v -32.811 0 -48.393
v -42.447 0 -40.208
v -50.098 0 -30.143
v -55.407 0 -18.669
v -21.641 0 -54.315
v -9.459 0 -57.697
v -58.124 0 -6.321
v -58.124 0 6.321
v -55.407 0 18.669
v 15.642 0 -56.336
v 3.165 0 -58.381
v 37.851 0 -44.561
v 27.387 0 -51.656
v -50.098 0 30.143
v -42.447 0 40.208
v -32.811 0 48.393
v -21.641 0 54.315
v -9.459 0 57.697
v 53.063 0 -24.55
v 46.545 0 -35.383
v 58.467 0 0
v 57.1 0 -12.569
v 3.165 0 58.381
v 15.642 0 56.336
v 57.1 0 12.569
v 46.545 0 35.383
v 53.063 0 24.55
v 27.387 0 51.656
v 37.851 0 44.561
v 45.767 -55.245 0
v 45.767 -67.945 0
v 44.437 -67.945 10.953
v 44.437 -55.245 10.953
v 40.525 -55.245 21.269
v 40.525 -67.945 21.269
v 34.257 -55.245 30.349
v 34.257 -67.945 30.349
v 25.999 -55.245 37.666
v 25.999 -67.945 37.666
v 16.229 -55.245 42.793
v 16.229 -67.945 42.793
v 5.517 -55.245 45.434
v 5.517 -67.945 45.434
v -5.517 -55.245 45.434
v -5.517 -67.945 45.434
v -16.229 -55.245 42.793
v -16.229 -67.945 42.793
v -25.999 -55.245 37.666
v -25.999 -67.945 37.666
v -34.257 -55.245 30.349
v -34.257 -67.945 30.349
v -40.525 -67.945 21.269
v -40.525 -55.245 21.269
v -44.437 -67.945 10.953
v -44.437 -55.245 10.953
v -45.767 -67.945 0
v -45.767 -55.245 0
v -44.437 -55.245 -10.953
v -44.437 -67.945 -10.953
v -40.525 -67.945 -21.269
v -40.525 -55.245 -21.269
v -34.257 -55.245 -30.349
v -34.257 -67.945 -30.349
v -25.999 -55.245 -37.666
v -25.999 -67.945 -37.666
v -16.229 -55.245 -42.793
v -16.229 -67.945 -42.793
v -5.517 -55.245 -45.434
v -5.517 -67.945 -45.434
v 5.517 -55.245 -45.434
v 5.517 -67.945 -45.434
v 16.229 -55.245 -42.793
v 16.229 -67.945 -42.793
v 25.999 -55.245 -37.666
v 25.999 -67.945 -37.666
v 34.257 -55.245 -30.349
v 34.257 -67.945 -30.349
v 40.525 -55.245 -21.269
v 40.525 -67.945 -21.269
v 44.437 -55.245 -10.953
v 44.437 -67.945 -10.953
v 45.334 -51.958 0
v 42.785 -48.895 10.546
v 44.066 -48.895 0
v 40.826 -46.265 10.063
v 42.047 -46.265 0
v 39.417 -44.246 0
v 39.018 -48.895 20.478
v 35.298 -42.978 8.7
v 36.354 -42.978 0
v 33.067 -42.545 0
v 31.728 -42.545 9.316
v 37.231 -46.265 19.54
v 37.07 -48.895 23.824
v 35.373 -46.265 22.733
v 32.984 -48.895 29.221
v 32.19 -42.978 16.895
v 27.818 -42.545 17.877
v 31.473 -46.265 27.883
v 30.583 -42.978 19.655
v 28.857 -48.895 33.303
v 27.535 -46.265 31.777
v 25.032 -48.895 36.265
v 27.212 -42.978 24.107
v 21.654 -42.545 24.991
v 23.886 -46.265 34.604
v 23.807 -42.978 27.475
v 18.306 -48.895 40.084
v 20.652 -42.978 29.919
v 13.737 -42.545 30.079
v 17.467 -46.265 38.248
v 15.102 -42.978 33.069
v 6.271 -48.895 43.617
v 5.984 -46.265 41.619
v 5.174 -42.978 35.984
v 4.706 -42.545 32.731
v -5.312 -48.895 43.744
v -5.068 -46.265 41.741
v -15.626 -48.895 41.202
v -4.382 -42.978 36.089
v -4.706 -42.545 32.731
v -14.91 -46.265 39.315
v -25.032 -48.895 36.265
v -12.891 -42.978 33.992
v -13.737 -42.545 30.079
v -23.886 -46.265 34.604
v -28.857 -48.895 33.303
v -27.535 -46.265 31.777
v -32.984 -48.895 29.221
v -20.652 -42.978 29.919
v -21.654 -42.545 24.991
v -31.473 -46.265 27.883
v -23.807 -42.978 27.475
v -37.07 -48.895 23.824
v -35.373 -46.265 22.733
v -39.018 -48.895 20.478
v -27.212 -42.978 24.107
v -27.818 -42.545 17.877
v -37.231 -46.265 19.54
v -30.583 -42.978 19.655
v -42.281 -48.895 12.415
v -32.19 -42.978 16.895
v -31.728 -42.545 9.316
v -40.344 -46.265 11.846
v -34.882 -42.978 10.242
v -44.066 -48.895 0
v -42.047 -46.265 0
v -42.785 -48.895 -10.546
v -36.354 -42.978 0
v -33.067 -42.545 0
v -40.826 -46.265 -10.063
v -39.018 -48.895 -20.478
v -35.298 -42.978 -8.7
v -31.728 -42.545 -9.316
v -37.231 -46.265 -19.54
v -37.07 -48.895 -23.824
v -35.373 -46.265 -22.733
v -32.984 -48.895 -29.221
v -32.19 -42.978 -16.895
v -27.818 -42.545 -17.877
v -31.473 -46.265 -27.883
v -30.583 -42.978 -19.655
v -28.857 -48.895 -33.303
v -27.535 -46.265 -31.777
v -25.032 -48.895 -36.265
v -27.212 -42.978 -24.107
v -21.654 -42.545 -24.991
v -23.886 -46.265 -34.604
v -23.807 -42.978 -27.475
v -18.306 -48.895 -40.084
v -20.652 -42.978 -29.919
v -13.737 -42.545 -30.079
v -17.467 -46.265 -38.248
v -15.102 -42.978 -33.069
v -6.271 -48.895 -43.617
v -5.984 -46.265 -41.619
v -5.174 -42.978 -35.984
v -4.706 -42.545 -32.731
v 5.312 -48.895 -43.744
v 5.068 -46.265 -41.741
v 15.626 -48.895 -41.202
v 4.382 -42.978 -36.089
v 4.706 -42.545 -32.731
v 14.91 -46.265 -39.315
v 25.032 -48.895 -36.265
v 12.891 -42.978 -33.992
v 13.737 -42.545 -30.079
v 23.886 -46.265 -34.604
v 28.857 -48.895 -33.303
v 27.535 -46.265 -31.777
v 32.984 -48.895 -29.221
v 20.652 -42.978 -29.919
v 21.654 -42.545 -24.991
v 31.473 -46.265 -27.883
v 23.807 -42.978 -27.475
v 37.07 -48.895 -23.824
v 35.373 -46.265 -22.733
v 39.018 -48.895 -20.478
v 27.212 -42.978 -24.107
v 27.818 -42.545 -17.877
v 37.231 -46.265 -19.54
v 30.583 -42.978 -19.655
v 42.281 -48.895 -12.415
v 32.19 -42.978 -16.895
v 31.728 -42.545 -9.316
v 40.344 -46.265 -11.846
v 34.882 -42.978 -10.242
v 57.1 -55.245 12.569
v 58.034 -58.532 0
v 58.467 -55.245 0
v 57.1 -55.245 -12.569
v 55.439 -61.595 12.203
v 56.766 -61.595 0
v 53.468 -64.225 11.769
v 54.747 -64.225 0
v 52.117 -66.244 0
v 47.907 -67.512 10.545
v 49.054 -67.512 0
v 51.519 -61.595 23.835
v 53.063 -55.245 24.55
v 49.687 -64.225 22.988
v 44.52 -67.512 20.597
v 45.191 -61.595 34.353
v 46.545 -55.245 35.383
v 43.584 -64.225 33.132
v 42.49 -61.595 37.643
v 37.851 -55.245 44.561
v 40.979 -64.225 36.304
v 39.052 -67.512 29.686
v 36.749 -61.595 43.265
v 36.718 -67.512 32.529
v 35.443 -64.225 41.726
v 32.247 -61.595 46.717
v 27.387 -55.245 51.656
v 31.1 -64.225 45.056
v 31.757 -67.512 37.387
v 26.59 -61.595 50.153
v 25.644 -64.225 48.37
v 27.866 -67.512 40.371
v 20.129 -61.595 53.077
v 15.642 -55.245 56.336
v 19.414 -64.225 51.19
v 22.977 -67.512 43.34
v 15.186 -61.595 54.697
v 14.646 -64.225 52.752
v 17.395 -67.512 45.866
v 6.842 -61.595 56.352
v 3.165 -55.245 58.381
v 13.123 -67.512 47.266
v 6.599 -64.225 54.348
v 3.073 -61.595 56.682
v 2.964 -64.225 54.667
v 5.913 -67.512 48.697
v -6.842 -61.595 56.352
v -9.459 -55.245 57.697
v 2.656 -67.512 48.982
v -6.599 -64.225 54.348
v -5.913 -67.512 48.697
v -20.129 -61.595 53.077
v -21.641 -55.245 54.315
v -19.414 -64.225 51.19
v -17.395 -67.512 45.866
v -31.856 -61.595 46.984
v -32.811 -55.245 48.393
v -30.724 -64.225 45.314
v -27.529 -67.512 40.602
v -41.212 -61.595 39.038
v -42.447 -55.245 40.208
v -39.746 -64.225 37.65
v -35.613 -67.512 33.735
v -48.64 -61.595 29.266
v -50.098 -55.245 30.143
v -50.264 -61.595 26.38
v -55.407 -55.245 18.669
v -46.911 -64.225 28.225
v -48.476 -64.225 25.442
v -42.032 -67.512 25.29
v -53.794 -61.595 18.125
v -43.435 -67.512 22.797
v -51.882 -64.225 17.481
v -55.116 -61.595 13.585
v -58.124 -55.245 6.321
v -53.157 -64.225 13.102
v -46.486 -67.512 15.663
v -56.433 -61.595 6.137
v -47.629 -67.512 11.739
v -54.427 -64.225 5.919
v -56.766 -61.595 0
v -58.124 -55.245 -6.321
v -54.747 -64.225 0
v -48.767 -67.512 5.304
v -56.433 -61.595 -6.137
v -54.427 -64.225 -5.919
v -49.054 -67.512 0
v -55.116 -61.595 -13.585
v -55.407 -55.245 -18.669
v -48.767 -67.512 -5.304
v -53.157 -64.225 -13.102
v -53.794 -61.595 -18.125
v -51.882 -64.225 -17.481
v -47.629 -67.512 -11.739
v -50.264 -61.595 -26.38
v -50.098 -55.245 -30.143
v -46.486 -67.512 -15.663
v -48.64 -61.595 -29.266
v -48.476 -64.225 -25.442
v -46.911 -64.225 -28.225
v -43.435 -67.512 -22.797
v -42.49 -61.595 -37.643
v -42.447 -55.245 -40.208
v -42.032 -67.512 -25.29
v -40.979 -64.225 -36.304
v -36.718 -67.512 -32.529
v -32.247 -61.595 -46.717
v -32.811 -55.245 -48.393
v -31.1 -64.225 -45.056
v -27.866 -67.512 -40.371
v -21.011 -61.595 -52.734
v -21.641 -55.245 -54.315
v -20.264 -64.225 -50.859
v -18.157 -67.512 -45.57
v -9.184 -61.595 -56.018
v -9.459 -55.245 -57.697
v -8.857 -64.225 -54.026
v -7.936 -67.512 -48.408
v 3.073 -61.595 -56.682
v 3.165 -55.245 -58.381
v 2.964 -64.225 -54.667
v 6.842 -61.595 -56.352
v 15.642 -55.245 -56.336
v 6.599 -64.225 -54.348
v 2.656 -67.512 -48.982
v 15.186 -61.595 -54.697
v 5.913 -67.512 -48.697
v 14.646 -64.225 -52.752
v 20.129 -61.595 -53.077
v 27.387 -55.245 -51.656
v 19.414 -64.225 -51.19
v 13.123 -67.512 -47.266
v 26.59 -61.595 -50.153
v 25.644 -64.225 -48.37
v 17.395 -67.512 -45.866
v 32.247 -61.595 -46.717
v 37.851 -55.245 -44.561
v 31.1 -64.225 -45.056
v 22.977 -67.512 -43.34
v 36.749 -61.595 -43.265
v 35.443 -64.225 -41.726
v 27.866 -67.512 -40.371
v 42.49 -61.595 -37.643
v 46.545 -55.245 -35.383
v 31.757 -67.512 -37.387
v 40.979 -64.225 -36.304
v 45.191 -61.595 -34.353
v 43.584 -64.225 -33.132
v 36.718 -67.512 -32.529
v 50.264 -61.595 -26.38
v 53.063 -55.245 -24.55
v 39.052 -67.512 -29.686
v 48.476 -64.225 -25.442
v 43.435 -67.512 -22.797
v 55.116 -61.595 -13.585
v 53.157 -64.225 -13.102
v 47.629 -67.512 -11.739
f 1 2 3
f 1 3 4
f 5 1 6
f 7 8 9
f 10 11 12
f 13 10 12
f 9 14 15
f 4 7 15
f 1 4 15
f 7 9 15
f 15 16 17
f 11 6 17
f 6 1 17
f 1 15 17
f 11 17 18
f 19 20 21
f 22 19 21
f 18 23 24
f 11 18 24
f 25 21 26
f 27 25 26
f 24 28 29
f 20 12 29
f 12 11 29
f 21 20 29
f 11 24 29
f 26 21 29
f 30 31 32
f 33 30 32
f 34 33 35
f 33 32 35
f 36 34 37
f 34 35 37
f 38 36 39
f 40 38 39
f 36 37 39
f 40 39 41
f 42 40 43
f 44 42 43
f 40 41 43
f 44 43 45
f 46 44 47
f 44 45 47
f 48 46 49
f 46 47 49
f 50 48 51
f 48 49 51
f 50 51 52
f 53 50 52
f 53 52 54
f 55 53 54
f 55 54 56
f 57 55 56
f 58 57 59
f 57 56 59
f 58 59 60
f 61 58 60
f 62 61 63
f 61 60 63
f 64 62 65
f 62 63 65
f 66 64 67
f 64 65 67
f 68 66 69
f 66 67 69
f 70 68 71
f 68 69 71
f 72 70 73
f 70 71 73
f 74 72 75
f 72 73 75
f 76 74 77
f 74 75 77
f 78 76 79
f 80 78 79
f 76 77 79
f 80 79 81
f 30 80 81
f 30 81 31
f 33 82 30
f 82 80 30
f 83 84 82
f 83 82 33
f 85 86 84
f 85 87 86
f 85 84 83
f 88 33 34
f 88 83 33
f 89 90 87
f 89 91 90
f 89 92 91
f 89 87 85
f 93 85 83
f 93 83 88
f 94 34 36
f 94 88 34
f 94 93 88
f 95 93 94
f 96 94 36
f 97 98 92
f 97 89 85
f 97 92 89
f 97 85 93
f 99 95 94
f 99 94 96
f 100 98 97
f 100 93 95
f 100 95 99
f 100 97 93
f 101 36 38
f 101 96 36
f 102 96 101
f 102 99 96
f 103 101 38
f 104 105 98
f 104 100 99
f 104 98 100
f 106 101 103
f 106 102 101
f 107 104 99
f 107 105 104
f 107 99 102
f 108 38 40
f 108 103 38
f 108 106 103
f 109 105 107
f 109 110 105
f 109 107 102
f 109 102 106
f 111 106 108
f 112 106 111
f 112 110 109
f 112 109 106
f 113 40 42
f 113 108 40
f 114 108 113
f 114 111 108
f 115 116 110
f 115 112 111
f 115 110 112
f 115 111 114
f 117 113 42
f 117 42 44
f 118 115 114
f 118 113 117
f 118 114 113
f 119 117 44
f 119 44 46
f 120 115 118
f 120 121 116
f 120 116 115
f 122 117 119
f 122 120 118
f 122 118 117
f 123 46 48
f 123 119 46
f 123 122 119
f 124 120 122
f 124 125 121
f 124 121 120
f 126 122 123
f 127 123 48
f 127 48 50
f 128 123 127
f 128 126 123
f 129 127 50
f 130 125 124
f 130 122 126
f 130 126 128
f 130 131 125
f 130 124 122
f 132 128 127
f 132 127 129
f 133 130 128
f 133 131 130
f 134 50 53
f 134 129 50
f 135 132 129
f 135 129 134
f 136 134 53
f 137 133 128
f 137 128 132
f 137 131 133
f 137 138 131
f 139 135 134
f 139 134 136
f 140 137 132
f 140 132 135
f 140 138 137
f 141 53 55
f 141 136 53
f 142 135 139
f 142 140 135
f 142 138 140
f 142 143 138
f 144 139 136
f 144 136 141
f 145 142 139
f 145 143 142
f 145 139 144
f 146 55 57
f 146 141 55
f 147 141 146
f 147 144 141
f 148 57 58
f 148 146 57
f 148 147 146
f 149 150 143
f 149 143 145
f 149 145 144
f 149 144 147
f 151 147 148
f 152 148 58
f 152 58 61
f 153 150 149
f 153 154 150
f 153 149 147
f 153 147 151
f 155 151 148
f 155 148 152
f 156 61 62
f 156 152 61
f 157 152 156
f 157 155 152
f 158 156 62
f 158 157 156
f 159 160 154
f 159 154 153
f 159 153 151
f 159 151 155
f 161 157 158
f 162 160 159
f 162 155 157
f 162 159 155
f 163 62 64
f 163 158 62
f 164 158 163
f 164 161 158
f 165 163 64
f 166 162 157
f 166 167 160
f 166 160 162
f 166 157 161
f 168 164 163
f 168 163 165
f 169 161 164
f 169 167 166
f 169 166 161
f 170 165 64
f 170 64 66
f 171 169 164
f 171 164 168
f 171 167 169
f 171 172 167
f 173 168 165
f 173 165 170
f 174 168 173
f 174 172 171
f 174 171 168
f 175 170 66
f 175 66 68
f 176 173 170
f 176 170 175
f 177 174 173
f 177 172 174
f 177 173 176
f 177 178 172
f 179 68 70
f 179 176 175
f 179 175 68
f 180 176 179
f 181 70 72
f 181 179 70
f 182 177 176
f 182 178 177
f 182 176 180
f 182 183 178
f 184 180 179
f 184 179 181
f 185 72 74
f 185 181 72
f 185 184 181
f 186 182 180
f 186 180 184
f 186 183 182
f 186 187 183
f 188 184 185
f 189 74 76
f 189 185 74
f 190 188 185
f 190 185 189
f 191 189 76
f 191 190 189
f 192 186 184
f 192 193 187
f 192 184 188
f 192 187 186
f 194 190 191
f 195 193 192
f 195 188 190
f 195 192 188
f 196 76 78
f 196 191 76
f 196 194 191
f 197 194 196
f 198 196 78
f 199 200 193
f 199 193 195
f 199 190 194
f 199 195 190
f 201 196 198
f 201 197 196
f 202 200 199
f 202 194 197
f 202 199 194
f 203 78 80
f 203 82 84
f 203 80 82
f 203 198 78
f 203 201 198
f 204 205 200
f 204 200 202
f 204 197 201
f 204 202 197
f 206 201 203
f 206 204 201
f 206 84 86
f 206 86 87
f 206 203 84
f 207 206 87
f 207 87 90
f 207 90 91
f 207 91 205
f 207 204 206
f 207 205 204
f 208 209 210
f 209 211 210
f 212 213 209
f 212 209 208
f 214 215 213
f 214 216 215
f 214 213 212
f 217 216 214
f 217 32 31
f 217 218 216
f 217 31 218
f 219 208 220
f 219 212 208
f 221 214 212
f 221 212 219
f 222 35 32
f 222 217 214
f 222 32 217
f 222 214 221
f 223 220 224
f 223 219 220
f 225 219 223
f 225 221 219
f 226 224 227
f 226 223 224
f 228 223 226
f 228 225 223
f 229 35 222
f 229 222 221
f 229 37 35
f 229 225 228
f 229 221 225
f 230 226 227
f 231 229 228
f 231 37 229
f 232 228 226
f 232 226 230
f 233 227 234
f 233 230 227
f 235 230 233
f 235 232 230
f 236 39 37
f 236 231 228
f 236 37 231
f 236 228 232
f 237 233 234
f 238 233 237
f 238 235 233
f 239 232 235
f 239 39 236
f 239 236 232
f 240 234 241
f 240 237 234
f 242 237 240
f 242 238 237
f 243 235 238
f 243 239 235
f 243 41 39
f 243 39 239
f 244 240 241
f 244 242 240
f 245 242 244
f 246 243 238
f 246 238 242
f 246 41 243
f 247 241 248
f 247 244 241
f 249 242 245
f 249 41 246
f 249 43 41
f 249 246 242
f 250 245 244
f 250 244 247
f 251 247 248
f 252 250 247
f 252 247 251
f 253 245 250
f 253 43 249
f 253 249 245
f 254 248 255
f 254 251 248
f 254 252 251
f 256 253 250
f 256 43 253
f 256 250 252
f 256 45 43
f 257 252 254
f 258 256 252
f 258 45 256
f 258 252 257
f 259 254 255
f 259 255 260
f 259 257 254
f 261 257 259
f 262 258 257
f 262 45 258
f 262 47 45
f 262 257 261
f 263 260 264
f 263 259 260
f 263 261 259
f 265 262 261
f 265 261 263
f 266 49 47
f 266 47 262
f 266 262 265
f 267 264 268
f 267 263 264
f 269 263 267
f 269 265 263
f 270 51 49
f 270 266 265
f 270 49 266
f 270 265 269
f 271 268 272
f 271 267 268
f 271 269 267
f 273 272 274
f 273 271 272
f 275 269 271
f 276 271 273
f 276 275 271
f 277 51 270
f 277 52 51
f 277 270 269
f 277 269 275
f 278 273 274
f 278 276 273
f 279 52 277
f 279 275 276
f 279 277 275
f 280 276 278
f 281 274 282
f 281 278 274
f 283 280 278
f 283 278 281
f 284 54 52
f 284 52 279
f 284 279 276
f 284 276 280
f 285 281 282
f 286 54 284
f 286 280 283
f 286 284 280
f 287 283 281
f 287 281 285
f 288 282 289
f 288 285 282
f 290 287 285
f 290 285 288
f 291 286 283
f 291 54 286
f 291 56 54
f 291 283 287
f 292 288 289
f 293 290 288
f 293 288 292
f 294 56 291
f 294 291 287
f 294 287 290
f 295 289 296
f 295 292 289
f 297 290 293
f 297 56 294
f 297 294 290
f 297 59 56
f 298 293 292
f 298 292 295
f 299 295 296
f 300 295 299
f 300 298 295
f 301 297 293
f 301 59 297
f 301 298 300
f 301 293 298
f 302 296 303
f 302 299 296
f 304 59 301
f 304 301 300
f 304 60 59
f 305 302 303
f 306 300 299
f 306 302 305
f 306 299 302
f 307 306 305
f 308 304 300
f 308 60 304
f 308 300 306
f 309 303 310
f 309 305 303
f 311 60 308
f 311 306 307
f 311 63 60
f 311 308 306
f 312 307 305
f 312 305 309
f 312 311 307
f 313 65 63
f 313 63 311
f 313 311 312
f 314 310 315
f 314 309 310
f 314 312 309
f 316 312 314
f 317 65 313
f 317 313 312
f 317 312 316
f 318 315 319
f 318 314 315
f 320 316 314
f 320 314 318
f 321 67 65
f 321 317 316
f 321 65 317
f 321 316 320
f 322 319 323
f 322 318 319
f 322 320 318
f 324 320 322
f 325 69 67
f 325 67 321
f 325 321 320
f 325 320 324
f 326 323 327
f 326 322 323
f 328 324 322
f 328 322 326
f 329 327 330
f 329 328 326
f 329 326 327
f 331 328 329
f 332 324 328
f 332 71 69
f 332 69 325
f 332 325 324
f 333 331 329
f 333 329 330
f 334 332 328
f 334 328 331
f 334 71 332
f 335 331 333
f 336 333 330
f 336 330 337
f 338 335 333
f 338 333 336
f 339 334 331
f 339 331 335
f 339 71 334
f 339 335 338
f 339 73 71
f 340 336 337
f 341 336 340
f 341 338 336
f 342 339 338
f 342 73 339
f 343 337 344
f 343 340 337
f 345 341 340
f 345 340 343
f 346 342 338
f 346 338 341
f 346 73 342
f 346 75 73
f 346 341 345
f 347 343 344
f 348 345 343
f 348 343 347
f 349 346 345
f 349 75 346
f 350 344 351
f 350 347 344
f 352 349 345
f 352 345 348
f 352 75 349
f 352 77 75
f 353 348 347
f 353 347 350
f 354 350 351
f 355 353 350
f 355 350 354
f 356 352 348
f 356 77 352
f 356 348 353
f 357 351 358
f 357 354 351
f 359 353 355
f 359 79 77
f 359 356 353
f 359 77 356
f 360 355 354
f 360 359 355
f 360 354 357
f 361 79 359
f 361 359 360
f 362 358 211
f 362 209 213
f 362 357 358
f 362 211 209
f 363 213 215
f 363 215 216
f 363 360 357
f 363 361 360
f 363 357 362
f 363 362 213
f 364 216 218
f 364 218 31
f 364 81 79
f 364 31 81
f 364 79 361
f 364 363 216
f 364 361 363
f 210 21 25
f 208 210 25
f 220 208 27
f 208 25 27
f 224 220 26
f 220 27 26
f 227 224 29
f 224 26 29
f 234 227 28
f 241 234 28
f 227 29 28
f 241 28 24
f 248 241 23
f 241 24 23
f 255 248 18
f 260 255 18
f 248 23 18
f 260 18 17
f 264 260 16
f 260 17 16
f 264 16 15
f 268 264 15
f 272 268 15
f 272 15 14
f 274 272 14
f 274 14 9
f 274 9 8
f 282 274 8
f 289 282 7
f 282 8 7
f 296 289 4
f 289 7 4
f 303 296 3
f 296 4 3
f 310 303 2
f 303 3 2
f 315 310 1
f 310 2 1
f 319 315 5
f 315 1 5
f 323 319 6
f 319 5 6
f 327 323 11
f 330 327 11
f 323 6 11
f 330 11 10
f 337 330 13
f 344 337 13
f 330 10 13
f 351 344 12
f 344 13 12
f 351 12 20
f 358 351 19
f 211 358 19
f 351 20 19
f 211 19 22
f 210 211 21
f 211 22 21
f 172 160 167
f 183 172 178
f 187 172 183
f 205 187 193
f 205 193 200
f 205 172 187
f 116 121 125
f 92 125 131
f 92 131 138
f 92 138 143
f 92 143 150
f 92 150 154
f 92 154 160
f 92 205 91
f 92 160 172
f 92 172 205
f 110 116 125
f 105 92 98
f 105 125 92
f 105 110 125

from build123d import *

# Parameters (mm, degrees)
F0_R     = 58.4672149413
F1_DEPTH = 67.945
F2_R     = 12.7
F3_R     = 45.7672149413
F3_R_2   = 18.3189453451
F4_DEPTH = 25.4
F5_R     = 12.7


with BuildPart() as f1:
    # F0 (on Front) → F1 (new body)
    with BuildSketch(Plane.XZ):
        Circle(F0_R)
    extrude(amount=F1_DEPTH)

    # F2
    f2_edges = [f1.edges().sort_by_distance(p)[0] for p in [
        (-58.467215, -67.945, 0),
    ]]
    fillet(f2_edges, radius=F2_R)

    # F3 (on face) → F4 (cut)
    with BuildSketch(Plane.XZ.offset(67.945)):
        Circle(F3_R)
        Circle(F3_R_2, mode=Mode.SUBTRACT)
        Circle(F3_R_2)
    extrude(amount=-F4_DEPTH, mode=Mode.SUBTRACT)

    # F5
    f5_edges = [f1.edges().sort_by_distance(p)[0] for p in [
        (-45.767215, -42.545, 0),
    ]]
    fillet(f5_edges, radius=F5_R)


solid = f1.part
